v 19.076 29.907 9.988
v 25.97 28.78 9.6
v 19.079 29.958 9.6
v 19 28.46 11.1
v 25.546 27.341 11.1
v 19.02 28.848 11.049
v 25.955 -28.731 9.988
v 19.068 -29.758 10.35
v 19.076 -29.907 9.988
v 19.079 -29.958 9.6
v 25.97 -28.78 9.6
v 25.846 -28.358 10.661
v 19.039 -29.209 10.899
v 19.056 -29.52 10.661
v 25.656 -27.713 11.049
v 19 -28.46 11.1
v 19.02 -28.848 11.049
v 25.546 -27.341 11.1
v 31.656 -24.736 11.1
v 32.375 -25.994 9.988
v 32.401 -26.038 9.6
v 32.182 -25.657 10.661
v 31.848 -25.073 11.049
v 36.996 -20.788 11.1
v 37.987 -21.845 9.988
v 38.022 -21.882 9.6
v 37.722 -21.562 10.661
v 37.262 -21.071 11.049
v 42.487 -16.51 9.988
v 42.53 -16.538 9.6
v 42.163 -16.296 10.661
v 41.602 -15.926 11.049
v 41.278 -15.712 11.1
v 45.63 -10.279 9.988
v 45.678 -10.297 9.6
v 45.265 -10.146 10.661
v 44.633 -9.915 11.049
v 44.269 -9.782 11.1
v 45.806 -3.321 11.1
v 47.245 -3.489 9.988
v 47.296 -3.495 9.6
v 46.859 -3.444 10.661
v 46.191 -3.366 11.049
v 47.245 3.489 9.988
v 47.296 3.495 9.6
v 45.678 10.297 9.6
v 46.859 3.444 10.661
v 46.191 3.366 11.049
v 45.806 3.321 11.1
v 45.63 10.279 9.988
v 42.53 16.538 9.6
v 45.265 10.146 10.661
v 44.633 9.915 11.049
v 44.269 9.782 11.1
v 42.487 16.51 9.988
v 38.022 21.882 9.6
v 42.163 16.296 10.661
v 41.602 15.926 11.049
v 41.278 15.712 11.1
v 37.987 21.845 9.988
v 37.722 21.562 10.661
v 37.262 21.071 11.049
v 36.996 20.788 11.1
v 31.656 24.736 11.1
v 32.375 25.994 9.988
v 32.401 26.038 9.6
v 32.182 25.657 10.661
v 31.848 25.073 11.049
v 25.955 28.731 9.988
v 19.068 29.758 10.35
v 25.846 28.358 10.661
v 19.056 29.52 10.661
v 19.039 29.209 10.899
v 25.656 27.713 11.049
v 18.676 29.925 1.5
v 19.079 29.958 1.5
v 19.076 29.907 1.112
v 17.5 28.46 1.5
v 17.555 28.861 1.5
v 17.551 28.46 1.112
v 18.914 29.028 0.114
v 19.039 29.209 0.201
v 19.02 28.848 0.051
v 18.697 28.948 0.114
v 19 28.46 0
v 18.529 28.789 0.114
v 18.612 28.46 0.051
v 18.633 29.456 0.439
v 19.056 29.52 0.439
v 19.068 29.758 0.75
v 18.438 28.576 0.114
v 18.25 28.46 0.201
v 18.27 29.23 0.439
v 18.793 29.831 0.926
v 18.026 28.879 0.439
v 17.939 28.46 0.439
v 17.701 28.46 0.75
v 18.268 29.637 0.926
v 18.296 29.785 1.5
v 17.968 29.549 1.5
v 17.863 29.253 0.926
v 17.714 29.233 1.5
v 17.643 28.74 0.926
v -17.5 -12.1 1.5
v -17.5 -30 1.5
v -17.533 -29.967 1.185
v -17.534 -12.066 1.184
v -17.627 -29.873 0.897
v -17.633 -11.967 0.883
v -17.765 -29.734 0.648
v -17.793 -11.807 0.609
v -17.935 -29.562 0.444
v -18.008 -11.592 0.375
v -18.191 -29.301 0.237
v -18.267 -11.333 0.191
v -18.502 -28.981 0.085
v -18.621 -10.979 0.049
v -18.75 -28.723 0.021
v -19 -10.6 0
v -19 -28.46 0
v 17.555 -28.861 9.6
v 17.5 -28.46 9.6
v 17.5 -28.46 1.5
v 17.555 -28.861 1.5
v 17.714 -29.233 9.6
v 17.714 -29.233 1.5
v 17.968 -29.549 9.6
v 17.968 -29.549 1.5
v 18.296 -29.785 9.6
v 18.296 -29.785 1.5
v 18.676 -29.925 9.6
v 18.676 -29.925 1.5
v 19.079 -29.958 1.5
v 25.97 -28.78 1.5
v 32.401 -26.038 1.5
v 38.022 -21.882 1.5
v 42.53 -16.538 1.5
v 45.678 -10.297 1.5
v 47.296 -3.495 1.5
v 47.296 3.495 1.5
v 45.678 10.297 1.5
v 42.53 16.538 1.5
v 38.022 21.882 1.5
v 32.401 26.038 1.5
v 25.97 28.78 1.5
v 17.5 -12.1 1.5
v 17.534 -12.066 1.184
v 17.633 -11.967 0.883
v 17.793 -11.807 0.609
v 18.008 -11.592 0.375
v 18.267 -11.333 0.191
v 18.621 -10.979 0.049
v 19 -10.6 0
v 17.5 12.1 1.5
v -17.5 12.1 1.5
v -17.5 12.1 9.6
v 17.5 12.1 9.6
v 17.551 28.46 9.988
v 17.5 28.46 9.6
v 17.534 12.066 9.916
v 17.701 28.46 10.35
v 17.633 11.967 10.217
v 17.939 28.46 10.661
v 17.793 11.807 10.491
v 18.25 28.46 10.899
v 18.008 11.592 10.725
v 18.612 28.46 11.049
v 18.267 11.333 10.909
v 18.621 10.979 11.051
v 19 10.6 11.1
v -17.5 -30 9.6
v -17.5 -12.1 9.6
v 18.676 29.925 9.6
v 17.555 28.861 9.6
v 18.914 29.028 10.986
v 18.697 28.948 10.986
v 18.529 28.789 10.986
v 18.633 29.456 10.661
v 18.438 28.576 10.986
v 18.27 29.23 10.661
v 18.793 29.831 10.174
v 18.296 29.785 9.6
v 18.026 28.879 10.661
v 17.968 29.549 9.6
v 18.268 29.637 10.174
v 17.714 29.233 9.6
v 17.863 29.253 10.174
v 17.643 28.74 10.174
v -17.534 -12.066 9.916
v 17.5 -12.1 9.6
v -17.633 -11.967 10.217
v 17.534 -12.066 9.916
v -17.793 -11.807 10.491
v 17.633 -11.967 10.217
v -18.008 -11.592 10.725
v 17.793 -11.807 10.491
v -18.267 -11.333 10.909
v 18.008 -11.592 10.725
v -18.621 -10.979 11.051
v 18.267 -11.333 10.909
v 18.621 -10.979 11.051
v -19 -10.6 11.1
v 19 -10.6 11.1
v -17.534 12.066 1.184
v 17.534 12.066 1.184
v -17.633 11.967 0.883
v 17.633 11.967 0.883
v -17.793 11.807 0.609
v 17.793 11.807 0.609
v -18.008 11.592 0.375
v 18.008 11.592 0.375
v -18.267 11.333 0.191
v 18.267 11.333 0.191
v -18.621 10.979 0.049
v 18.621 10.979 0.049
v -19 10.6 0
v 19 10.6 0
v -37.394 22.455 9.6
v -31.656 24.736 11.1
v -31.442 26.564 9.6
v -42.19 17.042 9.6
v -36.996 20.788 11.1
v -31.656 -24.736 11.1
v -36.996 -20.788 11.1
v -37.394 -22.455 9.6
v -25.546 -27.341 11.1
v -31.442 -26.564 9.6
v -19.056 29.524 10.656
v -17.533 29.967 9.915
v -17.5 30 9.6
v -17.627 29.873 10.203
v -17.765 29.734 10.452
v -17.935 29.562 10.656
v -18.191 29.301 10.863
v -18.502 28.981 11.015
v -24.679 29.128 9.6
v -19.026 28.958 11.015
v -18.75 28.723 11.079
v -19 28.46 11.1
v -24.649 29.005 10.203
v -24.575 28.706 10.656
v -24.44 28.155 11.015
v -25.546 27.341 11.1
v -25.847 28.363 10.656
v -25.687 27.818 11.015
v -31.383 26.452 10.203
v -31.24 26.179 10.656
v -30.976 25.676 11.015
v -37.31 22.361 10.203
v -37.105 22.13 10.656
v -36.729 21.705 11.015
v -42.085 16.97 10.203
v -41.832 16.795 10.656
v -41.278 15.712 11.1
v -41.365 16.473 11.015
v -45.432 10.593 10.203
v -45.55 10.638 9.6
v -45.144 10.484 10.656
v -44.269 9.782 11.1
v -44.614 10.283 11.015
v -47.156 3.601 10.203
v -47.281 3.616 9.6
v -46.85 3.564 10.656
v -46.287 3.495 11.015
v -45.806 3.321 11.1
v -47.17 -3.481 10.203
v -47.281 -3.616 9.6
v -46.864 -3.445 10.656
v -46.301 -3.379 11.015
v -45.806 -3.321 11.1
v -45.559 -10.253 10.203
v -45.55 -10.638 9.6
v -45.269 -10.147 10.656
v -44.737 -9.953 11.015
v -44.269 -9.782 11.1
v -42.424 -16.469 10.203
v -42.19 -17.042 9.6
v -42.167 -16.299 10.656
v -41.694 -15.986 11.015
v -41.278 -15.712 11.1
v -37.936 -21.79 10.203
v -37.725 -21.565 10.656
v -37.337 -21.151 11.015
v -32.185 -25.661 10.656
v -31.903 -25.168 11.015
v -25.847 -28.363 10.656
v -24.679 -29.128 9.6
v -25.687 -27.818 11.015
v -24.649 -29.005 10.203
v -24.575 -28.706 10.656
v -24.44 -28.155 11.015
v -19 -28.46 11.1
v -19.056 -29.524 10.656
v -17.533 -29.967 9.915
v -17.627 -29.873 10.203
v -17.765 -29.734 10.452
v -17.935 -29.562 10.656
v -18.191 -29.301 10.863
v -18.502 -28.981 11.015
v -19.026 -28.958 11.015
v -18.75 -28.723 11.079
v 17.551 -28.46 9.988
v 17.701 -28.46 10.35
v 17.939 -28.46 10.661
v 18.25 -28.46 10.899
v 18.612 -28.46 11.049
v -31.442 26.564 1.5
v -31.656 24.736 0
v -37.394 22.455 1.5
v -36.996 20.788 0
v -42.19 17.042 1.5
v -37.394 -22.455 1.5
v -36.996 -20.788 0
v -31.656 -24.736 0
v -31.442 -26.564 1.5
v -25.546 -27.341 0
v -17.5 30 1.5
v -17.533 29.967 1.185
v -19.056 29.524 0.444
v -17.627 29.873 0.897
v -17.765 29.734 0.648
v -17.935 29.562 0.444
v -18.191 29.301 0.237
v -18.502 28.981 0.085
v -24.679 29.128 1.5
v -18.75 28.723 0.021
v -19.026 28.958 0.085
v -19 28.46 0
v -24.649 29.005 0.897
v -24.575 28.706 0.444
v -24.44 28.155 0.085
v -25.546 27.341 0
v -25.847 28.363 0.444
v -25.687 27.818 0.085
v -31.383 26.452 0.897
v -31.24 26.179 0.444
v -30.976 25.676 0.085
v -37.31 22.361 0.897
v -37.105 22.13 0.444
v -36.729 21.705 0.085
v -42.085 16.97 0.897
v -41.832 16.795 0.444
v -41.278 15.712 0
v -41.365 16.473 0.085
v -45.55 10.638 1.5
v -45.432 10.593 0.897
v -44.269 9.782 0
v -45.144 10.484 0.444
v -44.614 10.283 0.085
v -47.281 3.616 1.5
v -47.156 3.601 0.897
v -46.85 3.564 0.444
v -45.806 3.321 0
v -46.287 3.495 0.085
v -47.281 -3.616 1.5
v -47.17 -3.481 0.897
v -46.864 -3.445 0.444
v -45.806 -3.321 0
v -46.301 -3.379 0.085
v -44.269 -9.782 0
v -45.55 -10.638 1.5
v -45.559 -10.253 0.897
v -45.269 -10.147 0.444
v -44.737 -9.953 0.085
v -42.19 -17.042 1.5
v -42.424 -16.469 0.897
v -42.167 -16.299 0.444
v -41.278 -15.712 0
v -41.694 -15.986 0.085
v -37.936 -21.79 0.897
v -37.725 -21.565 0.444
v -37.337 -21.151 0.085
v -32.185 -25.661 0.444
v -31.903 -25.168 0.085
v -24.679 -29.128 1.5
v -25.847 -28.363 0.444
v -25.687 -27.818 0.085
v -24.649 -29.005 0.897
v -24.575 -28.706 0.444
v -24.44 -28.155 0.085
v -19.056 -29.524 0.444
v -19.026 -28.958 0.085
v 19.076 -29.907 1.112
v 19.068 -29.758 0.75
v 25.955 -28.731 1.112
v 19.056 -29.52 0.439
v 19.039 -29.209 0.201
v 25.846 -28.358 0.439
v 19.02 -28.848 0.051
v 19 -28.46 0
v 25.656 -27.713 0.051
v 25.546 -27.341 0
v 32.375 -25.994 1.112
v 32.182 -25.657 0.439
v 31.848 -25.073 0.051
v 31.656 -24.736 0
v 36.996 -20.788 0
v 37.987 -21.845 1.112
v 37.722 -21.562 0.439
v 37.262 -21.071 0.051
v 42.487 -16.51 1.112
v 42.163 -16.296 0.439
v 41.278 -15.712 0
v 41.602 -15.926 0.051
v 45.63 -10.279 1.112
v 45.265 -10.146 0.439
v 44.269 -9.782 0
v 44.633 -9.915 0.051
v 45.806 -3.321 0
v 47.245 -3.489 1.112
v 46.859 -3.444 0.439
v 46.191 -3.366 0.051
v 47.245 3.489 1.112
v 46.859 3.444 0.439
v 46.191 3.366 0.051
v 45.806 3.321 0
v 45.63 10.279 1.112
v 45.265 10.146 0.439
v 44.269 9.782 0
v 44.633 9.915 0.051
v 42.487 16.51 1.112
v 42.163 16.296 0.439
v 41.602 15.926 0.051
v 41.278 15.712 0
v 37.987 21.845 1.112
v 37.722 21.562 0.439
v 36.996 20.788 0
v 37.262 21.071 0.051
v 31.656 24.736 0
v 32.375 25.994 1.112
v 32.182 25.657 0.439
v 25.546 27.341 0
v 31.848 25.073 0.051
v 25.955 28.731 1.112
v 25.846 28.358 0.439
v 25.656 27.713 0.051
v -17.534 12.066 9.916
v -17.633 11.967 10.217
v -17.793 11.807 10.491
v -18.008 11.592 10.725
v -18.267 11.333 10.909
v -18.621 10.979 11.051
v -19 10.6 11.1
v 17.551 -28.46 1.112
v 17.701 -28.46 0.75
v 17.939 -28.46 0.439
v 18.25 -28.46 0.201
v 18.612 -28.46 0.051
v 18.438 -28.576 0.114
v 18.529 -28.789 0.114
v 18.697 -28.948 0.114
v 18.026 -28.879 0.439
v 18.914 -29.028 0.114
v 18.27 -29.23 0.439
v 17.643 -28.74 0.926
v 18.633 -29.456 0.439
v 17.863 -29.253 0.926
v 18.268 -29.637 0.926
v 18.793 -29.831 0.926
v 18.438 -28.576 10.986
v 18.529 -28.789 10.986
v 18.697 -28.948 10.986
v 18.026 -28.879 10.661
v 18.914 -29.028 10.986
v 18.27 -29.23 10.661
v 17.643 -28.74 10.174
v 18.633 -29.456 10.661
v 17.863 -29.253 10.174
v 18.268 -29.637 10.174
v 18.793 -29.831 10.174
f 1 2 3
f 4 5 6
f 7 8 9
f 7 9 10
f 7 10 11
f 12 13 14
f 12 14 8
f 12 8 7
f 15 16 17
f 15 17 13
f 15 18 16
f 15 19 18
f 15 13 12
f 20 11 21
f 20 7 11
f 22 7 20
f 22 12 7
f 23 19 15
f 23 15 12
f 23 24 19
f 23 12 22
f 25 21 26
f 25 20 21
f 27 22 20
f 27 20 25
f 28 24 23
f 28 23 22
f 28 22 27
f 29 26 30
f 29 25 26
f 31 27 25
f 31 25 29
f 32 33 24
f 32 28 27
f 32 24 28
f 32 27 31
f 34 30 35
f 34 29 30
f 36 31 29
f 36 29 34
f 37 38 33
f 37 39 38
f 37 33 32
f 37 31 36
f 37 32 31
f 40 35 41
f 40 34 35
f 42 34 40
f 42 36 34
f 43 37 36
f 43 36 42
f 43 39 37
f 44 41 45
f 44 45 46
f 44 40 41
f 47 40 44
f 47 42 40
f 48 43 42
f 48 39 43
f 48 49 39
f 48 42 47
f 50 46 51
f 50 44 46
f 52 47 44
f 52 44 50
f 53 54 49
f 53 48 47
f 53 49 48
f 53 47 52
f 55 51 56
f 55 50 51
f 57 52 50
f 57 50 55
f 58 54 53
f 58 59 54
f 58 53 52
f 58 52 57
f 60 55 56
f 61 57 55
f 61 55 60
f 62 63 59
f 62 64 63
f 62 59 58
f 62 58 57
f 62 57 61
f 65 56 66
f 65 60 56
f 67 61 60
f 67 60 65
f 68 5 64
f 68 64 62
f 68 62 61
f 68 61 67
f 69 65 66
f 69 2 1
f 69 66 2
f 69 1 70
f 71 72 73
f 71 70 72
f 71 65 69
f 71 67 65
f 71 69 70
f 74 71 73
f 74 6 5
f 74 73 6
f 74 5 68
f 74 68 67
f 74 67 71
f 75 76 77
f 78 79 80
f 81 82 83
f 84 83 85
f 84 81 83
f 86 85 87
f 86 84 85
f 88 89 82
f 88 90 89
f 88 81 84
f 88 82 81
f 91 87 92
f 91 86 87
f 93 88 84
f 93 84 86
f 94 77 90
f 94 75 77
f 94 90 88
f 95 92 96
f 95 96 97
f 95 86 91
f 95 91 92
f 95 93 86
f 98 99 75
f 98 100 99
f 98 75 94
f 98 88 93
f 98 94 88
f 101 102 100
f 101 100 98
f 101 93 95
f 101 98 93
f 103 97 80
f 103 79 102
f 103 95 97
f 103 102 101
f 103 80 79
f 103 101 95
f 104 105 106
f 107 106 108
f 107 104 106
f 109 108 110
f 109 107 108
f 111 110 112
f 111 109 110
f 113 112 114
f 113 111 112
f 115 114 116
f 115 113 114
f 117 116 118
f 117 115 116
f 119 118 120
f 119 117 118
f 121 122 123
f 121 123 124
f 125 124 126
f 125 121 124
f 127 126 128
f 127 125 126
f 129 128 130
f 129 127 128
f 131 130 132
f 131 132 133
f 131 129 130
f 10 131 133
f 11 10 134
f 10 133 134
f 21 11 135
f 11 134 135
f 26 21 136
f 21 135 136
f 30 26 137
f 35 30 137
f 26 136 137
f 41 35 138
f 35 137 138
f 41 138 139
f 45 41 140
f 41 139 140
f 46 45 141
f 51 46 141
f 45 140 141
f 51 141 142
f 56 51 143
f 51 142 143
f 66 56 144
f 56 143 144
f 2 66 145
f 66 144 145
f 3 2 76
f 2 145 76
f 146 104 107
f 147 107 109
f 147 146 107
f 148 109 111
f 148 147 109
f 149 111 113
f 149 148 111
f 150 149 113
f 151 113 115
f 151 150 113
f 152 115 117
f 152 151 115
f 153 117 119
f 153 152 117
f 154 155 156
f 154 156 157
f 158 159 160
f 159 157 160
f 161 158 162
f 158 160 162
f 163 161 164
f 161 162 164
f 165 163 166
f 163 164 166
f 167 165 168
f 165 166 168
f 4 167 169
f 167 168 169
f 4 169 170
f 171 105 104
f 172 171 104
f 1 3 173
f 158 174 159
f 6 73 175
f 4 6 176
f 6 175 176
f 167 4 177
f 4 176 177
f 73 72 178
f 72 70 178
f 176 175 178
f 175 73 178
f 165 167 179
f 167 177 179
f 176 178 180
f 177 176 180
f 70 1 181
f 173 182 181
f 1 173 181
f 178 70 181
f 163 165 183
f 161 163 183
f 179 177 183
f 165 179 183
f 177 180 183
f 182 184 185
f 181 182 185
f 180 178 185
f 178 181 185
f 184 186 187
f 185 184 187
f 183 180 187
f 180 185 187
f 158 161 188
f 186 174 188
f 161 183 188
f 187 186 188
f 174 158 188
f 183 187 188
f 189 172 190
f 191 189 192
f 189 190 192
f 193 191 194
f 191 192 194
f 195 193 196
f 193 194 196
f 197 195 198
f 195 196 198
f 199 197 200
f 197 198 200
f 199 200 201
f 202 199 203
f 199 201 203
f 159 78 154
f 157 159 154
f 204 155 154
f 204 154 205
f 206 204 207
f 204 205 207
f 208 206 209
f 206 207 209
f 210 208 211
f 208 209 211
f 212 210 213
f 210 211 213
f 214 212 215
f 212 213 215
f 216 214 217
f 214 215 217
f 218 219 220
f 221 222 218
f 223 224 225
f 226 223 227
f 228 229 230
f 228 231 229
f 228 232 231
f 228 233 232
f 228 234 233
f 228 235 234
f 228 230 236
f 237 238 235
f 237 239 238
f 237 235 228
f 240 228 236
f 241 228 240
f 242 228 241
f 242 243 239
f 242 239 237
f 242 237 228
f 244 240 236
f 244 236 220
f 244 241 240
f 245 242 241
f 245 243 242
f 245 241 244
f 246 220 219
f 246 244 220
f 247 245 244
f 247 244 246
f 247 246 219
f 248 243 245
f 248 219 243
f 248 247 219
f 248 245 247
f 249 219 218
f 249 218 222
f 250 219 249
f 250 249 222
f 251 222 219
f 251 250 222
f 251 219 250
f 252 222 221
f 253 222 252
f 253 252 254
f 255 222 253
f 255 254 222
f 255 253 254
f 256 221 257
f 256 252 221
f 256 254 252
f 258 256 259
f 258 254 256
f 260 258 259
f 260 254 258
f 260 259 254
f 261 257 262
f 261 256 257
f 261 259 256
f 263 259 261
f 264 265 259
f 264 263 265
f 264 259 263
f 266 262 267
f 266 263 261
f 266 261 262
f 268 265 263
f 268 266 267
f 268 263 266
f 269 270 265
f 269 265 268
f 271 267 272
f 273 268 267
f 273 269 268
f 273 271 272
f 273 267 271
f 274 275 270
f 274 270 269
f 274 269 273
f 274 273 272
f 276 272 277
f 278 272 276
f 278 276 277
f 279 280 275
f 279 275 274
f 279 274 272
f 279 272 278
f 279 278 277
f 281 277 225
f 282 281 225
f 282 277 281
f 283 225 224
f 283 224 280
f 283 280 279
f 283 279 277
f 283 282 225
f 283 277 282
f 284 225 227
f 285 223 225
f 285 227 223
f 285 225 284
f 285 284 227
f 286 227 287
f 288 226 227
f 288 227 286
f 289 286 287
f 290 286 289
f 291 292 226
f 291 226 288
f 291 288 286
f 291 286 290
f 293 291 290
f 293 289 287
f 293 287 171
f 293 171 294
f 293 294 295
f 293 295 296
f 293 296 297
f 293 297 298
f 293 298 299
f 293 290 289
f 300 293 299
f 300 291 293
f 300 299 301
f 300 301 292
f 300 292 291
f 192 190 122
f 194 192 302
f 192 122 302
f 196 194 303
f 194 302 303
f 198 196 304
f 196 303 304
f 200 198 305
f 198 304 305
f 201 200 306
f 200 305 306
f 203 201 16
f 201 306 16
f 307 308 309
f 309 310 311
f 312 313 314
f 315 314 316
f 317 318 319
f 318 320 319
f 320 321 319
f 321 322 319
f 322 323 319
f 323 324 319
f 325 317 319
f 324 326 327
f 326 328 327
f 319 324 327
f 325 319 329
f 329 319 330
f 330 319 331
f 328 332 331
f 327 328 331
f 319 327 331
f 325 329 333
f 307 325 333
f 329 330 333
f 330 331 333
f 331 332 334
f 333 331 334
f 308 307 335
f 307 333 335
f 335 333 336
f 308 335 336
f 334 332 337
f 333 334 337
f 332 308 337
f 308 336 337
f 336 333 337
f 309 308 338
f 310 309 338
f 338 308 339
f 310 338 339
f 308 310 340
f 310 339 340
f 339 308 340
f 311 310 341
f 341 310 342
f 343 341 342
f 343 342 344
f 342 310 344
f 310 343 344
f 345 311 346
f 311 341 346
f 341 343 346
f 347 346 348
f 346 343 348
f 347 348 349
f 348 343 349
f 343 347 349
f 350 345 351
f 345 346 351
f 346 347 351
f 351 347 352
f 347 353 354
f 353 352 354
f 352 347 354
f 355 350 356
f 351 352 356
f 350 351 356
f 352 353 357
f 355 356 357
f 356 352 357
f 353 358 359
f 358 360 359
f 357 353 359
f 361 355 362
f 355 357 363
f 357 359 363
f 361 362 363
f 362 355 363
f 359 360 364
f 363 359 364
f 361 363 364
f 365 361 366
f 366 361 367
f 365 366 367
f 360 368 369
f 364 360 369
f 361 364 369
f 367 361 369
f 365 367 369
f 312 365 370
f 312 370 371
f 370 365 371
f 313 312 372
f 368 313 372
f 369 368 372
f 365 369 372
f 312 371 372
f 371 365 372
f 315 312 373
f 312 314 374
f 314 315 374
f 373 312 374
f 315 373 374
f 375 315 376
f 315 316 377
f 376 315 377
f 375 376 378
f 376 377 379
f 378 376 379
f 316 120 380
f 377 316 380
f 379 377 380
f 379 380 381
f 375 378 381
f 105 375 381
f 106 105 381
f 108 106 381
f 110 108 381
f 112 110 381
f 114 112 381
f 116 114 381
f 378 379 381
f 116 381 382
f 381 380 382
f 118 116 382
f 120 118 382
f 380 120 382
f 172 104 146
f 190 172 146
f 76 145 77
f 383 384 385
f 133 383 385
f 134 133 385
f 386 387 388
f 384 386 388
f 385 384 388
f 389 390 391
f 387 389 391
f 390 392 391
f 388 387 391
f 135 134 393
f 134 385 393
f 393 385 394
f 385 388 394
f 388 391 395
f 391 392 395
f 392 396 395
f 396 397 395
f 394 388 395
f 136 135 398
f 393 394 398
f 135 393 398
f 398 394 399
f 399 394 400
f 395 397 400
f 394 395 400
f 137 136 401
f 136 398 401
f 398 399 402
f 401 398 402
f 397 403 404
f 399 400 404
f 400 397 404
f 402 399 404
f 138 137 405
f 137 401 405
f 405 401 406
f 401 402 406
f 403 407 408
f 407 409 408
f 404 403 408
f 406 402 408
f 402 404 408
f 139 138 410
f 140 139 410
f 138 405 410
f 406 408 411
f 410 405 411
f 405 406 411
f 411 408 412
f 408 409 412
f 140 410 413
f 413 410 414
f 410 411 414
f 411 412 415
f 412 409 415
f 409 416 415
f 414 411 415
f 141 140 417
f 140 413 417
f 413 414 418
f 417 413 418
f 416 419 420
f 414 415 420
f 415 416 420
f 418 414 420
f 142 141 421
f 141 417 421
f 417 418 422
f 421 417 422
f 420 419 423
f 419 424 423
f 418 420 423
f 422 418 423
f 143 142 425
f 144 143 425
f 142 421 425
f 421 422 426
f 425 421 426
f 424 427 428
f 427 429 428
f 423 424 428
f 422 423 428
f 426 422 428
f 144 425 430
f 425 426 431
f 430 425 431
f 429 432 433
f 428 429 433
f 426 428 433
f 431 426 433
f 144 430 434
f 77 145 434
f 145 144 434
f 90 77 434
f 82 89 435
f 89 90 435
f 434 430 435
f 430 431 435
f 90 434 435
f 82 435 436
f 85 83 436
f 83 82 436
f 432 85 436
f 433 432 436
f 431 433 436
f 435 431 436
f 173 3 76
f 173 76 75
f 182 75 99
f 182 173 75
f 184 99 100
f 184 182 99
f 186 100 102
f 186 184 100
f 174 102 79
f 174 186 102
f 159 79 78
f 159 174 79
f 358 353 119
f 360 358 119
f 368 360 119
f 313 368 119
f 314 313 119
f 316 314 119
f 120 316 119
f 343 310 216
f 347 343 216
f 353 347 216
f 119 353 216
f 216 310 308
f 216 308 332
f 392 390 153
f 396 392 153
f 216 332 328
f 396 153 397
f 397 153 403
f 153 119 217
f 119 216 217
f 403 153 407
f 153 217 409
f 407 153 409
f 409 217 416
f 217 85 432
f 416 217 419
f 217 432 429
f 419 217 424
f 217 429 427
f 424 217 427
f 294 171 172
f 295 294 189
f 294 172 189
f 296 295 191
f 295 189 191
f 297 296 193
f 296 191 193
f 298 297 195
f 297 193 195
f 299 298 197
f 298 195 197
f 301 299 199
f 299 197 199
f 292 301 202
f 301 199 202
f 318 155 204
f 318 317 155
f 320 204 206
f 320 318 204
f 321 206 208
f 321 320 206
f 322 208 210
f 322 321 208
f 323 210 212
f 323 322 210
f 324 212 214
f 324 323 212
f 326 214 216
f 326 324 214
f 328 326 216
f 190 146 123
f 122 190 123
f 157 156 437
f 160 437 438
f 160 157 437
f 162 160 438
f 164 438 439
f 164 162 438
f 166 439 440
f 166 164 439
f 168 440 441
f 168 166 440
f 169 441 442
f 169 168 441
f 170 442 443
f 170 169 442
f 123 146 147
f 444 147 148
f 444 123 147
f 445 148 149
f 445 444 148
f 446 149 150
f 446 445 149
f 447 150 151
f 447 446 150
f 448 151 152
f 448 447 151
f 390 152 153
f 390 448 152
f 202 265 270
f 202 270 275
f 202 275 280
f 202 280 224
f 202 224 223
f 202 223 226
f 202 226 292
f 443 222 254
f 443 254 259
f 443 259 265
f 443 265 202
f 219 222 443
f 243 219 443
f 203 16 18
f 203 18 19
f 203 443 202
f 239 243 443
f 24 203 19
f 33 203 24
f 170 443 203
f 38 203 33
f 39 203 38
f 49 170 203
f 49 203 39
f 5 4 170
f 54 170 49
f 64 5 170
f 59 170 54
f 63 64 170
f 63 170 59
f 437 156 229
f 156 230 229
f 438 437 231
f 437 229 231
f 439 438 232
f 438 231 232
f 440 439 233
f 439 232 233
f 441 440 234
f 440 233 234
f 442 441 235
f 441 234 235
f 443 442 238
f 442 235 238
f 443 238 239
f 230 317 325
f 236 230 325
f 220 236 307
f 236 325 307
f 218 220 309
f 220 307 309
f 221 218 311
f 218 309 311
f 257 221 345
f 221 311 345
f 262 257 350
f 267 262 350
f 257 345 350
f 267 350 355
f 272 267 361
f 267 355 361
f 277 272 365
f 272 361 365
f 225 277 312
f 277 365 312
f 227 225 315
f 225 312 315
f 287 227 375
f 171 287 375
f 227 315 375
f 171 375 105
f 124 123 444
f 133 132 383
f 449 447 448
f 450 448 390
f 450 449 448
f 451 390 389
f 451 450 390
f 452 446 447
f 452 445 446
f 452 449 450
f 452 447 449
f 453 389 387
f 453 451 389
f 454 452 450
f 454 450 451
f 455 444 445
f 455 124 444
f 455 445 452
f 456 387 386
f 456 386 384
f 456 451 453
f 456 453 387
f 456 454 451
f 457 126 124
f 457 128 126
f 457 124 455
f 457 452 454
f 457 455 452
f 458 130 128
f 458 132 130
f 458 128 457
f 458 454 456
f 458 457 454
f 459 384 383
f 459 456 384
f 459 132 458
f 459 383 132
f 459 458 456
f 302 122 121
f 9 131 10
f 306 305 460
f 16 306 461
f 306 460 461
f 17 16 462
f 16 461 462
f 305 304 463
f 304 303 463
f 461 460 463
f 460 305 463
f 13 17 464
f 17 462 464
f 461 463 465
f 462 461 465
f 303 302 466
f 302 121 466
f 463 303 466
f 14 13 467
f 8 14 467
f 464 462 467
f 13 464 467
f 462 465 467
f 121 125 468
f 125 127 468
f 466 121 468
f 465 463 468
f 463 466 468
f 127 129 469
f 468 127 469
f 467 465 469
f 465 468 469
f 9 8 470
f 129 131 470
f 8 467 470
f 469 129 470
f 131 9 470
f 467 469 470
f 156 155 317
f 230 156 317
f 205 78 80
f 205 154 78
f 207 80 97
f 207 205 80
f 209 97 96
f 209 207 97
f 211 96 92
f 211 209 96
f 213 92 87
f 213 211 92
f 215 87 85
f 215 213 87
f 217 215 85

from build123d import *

# Parameters (mm, degrees)
F0_W     = 35
F0_H     = 24.2
F1_DEPTH = 11.1
F2_R     = 1.5


with BuildPart() as f1:
    # F0 (on Top) → F1 (new body)
    with BuildSketch(Plane.XY):
        with BuildLine():
            Line((-17.5, -12.1), (-17.5, 12.1))
            Line((-17.5, 12.1), (-17.5, 30))
            ThreePointArc((-17.5, 30), (-47.5, 0), (-17.5, -30))
            Line((-17.5, -30), (-17.5, -12.1))
        make_face()
        with BuildLine():
            Line((17.5, 30), (17.5, 12.1))
            Line((17.5, 12.1), (17.5, -12.1))
            Line((17.5, -12.1), (17.5, -30))
            ThreePointArc((17.5, -30), (47.5, 0), (17.5, 30))
        make_face()
        Rectangle(F0_W, F0_H)
    extrude(amount=F1_DEPTH)

    # F2
    f2_edges = [f1.edges().sort_by_distance(p)[0] for p in [
        (-47.5, 0, 11.1),
        (-17.5, 21.05, 11.1),
        (-17.5, -21.05, 11.1),
        (0, -12.1, 11.1),
        (17.5, -21.05, 11.1),
        (47.5, 0, 11.1),
        (17.5, 21.05, 11.1),
        (0, 12.1, 11.1),
        (-17.5, -21.05, 0),
        (0, -12.1, 0),
        (17.5, -21.05, 0),
        (47.5, 0, 0),
        (17.5, 21.05, 0),
        (0, 12.1, 0),
        (-17.5, 21.05, 0),
        (-47.5, 0, 0),
        (17.5, -30, 5.55),
        (17.5, 30, 5.55),
    ]]
    fillet(f2_edges, radius=F2_R)


solid = f1.part
